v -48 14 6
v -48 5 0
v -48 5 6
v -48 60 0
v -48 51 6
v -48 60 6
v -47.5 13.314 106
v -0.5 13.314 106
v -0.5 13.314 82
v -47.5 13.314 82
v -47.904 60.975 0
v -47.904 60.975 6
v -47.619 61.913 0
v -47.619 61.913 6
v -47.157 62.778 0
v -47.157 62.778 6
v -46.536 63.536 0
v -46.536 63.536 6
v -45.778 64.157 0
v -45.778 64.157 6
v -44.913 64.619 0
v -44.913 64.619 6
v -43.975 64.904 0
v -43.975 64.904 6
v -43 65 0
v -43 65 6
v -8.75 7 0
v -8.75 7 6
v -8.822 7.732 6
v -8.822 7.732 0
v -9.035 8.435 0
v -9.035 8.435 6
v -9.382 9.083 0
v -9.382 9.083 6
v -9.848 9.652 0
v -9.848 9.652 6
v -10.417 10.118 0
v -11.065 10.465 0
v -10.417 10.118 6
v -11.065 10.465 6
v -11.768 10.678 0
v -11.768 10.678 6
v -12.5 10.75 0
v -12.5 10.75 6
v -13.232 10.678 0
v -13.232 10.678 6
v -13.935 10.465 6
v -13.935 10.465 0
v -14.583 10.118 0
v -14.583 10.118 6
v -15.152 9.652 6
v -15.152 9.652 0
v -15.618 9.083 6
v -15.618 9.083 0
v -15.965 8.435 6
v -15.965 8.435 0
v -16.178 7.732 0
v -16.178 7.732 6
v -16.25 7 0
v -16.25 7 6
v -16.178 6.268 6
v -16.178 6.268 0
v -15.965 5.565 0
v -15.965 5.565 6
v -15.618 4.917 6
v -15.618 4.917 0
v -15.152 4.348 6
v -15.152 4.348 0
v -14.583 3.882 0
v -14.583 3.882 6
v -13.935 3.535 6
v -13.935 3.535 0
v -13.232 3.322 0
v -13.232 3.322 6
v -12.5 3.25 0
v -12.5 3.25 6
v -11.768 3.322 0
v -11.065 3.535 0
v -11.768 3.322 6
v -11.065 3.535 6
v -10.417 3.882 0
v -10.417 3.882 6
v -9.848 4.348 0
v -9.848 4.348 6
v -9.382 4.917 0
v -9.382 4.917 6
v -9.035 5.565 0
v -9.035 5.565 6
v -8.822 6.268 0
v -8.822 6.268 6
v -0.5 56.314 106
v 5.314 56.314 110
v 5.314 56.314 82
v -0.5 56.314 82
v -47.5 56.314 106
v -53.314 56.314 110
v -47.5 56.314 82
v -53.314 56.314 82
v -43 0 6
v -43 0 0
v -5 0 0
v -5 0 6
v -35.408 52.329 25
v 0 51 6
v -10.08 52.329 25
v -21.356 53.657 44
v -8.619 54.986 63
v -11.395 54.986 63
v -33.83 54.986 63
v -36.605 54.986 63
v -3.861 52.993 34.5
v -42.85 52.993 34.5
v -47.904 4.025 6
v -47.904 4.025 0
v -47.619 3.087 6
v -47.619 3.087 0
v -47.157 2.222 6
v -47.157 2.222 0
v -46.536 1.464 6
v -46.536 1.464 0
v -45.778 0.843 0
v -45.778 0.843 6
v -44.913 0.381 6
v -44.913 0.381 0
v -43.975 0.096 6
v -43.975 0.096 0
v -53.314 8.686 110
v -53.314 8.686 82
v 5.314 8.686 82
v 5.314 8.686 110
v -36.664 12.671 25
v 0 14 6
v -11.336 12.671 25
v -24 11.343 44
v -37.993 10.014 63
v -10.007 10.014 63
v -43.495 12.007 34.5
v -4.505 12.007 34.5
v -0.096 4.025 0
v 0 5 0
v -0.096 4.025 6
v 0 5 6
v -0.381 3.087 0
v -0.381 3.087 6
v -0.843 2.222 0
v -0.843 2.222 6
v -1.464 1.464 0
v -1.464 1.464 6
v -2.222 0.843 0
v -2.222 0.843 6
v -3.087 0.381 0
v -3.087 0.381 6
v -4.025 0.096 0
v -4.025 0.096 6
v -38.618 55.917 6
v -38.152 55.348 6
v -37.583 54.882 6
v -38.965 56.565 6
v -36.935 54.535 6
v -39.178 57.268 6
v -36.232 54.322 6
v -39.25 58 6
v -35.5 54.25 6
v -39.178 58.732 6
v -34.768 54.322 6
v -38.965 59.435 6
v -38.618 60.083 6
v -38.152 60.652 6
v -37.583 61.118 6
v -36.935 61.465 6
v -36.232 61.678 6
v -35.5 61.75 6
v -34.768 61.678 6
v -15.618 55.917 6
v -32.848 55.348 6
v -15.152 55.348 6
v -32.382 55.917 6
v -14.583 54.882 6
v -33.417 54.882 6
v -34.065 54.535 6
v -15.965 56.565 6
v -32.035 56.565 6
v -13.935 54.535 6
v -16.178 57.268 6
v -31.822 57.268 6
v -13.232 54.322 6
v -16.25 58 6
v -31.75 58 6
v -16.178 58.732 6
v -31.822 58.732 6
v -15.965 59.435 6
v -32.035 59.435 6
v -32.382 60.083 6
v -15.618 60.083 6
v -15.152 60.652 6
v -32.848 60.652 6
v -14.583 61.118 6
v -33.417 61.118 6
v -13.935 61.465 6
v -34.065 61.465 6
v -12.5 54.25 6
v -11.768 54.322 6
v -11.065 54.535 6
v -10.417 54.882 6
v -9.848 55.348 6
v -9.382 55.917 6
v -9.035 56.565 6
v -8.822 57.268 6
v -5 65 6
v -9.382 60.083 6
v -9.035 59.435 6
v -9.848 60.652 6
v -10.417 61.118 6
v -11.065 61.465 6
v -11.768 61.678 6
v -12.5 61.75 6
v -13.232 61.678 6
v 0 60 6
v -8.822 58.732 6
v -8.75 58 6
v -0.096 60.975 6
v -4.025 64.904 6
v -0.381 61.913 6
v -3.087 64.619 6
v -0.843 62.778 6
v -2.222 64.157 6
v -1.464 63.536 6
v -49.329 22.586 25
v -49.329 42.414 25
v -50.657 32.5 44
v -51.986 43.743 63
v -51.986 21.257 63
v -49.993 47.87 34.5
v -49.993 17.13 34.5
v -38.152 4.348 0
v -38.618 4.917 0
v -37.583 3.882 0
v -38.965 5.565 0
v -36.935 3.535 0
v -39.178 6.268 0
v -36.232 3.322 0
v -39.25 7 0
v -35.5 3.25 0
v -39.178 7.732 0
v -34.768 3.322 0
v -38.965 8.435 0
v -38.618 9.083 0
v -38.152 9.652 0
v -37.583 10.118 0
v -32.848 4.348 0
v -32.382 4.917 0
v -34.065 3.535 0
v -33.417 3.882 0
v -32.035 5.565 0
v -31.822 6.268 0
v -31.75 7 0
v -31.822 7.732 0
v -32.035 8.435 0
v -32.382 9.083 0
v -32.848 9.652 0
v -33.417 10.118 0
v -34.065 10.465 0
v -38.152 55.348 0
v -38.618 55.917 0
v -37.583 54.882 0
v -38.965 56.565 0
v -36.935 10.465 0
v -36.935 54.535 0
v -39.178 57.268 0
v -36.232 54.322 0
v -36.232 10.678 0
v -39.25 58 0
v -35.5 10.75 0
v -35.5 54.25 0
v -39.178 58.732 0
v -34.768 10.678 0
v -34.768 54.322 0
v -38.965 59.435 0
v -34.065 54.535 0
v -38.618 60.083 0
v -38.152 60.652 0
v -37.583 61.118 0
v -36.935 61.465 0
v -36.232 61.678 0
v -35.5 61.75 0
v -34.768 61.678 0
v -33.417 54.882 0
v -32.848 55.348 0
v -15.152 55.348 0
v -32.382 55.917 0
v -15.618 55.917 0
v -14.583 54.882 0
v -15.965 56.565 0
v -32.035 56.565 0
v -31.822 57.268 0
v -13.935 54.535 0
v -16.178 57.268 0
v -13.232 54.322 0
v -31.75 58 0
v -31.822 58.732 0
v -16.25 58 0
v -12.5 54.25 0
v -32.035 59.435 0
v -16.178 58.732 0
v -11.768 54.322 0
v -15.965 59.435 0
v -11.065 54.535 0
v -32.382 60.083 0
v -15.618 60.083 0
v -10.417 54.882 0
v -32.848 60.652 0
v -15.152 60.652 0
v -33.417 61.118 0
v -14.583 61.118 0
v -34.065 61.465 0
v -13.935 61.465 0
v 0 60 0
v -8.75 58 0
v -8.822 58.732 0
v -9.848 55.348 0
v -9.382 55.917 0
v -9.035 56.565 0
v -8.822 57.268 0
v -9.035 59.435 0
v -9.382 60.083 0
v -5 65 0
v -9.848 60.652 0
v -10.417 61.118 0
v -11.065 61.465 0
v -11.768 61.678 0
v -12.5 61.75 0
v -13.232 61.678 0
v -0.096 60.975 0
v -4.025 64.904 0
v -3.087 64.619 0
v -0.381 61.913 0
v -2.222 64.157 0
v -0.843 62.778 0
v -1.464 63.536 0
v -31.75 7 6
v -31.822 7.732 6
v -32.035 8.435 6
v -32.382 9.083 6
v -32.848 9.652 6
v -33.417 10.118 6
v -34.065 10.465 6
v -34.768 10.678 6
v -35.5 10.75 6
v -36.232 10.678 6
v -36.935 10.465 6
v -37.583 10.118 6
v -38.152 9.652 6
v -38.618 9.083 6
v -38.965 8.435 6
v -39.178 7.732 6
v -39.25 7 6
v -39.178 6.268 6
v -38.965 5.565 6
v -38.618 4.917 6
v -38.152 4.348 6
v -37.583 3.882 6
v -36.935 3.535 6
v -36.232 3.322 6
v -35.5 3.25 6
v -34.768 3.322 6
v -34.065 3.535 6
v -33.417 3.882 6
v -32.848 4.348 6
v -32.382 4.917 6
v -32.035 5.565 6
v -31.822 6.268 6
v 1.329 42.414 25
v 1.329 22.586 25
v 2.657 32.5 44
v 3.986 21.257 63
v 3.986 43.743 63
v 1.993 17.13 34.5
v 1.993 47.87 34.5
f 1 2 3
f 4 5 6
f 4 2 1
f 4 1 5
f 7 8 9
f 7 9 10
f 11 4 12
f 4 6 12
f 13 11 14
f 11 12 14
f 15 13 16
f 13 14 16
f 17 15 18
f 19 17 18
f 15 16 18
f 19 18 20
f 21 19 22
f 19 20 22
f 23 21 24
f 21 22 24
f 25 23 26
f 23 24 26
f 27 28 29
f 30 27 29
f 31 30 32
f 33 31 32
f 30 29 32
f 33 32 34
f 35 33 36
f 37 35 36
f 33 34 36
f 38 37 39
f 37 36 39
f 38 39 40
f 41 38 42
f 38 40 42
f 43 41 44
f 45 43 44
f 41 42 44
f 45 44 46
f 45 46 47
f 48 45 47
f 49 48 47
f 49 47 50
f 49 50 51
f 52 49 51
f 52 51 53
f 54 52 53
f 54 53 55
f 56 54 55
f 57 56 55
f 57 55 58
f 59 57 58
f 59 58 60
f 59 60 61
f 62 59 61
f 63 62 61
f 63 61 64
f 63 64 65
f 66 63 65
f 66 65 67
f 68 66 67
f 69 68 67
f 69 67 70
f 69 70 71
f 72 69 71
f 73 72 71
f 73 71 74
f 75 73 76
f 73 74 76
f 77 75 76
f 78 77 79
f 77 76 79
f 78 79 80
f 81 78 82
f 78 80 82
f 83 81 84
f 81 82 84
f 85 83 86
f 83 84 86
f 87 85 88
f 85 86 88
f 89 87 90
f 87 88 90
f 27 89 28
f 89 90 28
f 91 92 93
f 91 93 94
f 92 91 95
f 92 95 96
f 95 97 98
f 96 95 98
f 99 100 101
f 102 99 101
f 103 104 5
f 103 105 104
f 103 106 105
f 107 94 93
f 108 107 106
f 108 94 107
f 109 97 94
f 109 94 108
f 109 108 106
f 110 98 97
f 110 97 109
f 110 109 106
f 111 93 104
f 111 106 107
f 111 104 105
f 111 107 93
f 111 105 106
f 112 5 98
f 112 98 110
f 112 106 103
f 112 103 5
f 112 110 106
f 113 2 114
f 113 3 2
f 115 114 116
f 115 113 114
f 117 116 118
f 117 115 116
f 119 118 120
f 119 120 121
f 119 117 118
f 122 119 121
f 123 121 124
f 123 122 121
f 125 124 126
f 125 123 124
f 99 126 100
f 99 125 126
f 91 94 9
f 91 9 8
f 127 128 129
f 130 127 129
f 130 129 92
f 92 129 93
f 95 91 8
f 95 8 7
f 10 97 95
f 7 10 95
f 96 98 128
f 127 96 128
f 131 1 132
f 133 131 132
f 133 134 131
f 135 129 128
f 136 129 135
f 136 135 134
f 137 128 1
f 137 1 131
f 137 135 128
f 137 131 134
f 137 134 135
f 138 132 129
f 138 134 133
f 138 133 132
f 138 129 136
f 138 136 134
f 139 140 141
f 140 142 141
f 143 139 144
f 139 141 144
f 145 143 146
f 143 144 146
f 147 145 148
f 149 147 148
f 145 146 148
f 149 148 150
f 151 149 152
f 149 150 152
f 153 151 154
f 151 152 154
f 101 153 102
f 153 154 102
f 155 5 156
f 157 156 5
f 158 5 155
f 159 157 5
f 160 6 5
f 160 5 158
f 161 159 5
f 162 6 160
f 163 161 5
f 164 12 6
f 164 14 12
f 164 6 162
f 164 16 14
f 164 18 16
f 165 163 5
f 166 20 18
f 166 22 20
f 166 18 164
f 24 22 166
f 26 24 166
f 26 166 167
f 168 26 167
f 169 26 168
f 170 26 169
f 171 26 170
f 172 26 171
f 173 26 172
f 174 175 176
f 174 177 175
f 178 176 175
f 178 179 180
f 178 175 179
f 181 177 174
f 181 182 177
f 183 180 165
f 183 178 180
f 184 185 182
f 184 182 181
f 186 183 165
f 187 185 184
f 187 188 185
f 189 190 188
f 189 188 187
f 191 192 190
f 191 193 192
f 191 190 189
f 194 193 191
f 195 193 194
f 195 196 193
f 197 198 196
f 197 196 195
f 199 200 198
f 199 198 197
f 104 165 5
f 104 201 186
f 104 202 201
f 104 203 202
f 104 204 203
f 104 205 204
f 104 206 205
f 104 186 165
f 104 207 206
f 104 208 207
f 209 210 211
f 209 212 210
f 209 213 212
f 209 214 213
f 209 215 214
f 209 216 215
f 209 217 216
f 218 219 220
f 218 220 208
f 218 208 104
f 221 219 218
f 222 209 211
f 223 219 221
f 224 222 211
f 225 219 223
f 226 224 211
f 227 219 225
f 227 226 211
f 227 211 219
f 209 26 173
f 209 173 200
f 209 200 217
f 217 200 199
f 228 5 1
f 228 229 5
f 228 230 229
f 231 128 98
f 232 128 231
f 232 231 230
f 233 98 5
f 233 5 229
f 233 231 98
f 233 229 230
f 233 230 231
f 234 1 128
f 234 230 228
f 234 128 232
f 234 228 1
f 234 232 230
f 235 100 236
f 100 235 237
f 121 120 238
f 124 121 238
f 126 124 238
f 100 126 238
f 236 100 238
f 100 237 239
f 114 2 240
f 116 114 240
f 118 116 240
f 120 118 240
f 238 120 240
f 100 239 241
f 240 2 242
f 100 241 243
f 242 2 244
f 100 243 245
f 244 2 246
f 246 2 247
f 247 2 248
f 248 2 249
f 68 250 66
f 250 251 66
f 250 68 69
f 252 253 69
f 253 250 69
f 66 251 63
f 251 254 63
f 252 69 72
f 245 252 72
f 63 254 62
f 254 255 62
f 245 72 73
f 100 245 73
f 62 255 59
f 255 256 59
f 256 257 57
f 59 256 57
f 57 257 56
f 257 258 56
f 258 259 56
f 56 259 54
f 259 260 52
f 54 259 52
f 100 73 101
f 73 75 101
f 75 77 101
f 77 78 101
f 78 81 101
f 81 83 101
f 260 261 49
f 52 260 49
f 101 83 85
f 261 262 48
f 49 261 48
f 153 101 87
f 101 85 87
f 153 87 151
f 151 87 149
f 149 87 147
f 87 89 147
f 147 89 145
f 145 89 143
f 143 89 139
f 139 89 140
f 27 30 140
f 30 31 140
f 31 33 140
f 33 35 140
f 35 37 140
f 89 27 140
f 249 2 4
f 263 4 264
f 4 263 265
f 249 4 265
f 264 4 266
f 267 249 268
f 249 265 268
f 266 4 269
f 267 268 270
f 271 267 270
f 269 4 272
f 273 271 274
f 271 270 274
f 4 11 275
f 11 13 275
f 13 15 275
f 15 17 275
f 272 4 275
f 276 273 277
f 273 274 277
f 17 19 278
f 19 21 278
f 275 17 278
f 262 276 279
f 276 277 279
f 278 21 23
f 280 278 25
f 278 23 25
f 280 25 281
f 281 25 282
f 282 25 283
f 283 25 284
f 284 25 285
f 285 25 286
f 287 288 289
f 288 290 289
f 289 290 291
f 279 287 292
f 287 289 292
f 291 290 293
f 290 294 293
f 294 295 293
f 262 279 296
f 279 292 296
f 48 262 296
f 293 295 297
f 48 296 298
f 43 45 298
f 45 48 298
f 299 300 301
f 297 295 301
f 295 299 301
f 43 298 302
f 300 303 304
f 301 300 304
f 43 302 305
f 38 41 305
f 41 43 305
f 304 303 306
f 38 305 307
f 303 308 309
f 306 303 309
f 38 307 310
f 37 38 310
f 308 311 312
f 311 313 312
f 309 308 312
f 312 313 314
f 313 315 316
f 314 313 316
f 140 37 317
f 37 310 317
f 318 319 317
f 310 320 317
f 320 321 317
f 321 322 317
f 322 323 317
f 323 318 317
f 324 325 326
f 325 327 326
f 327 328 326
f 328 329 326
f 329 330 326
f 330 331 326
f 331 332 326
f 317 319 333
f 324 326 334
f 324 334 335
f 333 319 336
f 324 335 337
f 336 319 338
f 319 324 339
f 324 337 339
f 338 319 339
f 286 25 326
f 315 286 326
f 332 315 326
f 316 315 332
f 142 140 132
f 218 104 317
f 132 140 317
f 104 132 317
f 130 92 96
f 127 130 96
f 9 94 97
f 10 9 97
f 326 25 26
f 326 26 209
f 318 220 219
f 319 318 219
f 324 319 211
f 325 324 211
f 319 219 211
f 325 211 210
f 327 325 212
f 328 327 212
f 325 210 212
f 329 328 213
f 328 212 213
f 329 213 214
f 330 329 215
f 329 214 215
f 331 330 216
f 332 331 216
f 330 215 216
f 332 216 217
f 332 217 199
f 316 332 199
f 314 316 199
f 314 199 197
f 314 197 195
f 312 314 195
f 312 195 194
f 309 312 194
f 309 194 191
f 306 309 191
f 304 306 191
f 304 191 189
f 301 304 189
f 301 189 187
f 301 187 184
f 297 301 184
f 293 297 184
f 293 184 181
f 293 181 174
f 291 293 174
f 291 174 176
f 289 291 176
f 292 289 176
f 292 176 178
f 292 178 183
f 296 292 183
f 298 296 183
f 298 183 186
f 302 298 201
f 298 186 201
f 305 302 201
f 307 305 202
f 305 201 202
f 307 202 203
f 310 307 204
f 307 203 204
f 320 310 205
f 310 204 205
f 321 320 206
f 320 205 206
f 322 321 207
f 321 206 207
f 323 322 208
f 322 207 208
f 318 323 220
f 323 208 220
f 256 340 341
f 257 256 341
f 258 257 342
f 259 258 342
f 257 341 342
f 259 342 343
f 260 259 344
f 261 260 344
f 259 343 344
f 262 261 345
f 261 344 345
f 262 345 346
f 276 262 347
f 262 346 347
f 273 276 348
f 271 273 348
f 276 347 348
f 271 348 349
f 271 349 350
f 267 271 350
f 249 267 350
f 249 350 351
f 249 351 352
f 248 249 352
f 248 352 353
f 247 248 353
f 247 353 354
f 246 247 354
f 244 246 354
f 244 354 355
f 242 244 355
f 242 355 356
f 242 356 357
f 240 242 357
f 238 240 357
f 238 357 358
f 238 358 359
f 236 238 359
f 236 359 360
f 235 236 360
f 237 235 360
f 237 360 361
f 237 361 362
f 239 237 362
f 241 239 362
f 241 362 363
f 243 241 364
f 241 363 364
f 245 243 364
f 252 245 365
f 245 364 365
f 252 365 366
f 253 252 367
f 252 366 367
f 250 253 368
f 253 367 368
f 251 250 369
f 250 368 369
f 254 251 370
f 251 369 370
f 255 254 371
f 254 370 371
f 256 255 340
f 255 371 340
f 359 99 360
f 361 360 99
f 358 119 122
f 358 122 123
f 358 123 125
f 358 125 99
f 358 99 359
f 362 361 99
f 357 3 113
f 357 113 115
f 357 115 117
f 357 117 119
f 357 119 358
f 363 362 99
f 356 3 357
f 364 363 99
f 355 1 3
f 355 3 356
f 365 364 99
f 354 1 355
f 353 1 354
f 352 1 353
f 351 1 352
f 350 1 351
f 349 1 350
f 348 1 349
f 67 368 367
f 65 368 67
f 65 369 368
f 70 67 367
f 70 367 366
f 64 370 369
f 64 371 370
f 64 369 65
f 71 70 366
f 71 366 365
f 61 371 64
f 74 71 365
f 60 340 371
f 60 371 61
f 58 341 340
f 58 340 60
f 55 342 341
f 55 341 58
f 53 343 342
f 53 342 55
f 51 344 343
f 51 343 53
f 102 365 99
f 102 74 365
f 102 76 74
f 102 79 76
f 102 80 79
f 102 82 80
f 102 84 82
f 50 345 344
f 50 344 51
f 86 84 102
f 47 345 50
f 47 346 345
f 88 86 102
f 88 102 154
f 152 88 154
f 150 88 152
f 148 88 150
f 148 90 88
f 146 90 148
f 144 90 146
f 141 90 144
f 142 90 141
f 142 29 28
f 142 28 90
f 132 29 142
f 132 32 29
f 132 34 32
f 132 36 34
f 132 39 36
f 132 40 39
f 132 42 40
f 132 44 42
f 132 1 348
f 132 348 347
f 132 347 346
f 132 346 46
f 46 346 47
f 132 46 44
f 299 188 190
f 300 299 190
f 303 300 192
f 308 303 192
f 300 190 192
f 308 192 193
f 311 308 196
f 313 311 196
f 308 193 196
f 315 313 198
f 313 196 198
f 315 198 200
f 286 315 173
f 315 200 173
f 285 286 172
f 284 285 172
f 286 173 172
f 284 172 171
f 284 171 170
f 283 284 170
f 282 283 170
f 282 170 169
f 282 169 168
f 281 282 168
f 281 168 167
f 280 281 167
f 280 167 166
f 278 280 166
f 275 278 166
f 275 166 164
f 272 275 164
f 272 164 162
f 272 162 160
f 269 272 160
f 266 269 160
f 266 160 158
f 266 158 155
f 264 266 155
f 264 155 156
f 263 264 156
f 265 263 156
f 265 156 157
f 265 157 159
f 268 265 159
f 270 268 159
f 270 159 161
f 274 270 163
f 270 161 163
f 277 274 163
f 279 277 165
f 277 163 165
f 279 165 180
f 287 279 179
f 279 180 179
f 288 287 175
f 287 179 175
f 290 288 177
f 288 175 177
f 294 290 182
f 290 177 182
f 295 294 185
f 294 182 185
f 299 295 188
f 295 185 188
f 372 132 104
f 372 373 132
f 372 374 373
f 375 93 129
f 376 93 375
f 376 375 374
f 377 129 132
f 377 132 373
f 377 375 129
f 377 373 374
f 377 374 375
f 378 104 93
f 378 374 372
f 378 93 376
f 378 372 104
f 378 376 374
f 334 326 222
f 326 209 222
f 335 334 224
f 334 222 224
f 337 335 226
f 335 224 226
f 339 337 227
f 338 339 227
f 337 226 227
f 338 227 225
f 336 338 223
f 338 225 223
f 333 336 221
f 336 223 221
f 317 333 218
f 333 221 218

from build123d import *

# Parameters (mm, degrees)
F0_W     = 48
F0_H     = 65
F1_DEPTH = 6
F2_W     = 24
F2_H     = 18.5
F3_DEPTH = 76
F3_TAPER = -4
F4_DEPTH = 28
F5_W     = 47
F5_H     = 24
F6_DEPTH = 43
F8_R     = 3.75
F7_R     = 3.75
F9_DEPTH = 25
F10_R    = 5


with BuildPart() as f1:
    # F0 (on Top) → F1 (new body)
    with BuildSketch(Plane.XY):
        with Locations((-24, 32.5)):
            Rectangle(F0_W, F0_H)
    extrude(amount=F1_DEPTH)

    # F2 (on face) → F3 (join)
    with BuildSketch(Plane.XY.offset(6)):
        with Locations((-12, 41.75)):
            Rectangle(F2_W, F2_H)
        with Locations((-36, 41.75)):
            Rectangle(F2_W, F2_H)
        with Locations((-36, 23.25)):
            Rectangle(F2_W, F2_H)
        with Locations((-12, 23.25)):
            Rectangle(F2_W, F2_H)
    extrude(amount=F3_DEPTH, taper=F3_TAPER)

    # F4 (add): a face of the model
    f4_faces = [f1.faces().sort_by_distance(p)[0] for p in [
        (-24, 32.5, 82),
    ]]
    extrude(f4_faces, amount=F4_DEPTH)

    # F5 (on face) → F6 (cut)
    with BuildSketch(Plane(origin=(0, 56.3144377077, 0), x_dir=(-1, 0, 0), z_dir=(0, 1, 0))):
        with Locations((24, 94)):
            Rectangle(F5_W, F5_H)
    extrude(amount=-F6_DEPTH, mode=Mode.SUBTRACT)

    # F8 (on face) + F7 (on face) → F9 (cut)
    with BuildSketch(Plane.XY.offset(6)):
        with Locations((-35.5, 7)):
            Circle(F8_R)
        with Locations((-12.5, 7)):
            Circle(F8_R)
    with BuildSketch(Plane.XY.offset(6)):
        with Locations((-12.5, 58)):
            Circle(F7_R)
        with Locations((-35.5, 58)):
            Circle(F7_R)
    extrude(amount=-F9_DEPTH, mode=Mode.SUBTRACT)

    # F10
    f10_edges = [f1.edges().sort_by_distance(p)[0] for p in [
        (-48, 0, 3),
        (0, 0, 3),
        (0, 65, 3),
        (-48, 65, 3),
    ]]
    fillet(f10_edges, radius=F10_R)


solid = f1.part
